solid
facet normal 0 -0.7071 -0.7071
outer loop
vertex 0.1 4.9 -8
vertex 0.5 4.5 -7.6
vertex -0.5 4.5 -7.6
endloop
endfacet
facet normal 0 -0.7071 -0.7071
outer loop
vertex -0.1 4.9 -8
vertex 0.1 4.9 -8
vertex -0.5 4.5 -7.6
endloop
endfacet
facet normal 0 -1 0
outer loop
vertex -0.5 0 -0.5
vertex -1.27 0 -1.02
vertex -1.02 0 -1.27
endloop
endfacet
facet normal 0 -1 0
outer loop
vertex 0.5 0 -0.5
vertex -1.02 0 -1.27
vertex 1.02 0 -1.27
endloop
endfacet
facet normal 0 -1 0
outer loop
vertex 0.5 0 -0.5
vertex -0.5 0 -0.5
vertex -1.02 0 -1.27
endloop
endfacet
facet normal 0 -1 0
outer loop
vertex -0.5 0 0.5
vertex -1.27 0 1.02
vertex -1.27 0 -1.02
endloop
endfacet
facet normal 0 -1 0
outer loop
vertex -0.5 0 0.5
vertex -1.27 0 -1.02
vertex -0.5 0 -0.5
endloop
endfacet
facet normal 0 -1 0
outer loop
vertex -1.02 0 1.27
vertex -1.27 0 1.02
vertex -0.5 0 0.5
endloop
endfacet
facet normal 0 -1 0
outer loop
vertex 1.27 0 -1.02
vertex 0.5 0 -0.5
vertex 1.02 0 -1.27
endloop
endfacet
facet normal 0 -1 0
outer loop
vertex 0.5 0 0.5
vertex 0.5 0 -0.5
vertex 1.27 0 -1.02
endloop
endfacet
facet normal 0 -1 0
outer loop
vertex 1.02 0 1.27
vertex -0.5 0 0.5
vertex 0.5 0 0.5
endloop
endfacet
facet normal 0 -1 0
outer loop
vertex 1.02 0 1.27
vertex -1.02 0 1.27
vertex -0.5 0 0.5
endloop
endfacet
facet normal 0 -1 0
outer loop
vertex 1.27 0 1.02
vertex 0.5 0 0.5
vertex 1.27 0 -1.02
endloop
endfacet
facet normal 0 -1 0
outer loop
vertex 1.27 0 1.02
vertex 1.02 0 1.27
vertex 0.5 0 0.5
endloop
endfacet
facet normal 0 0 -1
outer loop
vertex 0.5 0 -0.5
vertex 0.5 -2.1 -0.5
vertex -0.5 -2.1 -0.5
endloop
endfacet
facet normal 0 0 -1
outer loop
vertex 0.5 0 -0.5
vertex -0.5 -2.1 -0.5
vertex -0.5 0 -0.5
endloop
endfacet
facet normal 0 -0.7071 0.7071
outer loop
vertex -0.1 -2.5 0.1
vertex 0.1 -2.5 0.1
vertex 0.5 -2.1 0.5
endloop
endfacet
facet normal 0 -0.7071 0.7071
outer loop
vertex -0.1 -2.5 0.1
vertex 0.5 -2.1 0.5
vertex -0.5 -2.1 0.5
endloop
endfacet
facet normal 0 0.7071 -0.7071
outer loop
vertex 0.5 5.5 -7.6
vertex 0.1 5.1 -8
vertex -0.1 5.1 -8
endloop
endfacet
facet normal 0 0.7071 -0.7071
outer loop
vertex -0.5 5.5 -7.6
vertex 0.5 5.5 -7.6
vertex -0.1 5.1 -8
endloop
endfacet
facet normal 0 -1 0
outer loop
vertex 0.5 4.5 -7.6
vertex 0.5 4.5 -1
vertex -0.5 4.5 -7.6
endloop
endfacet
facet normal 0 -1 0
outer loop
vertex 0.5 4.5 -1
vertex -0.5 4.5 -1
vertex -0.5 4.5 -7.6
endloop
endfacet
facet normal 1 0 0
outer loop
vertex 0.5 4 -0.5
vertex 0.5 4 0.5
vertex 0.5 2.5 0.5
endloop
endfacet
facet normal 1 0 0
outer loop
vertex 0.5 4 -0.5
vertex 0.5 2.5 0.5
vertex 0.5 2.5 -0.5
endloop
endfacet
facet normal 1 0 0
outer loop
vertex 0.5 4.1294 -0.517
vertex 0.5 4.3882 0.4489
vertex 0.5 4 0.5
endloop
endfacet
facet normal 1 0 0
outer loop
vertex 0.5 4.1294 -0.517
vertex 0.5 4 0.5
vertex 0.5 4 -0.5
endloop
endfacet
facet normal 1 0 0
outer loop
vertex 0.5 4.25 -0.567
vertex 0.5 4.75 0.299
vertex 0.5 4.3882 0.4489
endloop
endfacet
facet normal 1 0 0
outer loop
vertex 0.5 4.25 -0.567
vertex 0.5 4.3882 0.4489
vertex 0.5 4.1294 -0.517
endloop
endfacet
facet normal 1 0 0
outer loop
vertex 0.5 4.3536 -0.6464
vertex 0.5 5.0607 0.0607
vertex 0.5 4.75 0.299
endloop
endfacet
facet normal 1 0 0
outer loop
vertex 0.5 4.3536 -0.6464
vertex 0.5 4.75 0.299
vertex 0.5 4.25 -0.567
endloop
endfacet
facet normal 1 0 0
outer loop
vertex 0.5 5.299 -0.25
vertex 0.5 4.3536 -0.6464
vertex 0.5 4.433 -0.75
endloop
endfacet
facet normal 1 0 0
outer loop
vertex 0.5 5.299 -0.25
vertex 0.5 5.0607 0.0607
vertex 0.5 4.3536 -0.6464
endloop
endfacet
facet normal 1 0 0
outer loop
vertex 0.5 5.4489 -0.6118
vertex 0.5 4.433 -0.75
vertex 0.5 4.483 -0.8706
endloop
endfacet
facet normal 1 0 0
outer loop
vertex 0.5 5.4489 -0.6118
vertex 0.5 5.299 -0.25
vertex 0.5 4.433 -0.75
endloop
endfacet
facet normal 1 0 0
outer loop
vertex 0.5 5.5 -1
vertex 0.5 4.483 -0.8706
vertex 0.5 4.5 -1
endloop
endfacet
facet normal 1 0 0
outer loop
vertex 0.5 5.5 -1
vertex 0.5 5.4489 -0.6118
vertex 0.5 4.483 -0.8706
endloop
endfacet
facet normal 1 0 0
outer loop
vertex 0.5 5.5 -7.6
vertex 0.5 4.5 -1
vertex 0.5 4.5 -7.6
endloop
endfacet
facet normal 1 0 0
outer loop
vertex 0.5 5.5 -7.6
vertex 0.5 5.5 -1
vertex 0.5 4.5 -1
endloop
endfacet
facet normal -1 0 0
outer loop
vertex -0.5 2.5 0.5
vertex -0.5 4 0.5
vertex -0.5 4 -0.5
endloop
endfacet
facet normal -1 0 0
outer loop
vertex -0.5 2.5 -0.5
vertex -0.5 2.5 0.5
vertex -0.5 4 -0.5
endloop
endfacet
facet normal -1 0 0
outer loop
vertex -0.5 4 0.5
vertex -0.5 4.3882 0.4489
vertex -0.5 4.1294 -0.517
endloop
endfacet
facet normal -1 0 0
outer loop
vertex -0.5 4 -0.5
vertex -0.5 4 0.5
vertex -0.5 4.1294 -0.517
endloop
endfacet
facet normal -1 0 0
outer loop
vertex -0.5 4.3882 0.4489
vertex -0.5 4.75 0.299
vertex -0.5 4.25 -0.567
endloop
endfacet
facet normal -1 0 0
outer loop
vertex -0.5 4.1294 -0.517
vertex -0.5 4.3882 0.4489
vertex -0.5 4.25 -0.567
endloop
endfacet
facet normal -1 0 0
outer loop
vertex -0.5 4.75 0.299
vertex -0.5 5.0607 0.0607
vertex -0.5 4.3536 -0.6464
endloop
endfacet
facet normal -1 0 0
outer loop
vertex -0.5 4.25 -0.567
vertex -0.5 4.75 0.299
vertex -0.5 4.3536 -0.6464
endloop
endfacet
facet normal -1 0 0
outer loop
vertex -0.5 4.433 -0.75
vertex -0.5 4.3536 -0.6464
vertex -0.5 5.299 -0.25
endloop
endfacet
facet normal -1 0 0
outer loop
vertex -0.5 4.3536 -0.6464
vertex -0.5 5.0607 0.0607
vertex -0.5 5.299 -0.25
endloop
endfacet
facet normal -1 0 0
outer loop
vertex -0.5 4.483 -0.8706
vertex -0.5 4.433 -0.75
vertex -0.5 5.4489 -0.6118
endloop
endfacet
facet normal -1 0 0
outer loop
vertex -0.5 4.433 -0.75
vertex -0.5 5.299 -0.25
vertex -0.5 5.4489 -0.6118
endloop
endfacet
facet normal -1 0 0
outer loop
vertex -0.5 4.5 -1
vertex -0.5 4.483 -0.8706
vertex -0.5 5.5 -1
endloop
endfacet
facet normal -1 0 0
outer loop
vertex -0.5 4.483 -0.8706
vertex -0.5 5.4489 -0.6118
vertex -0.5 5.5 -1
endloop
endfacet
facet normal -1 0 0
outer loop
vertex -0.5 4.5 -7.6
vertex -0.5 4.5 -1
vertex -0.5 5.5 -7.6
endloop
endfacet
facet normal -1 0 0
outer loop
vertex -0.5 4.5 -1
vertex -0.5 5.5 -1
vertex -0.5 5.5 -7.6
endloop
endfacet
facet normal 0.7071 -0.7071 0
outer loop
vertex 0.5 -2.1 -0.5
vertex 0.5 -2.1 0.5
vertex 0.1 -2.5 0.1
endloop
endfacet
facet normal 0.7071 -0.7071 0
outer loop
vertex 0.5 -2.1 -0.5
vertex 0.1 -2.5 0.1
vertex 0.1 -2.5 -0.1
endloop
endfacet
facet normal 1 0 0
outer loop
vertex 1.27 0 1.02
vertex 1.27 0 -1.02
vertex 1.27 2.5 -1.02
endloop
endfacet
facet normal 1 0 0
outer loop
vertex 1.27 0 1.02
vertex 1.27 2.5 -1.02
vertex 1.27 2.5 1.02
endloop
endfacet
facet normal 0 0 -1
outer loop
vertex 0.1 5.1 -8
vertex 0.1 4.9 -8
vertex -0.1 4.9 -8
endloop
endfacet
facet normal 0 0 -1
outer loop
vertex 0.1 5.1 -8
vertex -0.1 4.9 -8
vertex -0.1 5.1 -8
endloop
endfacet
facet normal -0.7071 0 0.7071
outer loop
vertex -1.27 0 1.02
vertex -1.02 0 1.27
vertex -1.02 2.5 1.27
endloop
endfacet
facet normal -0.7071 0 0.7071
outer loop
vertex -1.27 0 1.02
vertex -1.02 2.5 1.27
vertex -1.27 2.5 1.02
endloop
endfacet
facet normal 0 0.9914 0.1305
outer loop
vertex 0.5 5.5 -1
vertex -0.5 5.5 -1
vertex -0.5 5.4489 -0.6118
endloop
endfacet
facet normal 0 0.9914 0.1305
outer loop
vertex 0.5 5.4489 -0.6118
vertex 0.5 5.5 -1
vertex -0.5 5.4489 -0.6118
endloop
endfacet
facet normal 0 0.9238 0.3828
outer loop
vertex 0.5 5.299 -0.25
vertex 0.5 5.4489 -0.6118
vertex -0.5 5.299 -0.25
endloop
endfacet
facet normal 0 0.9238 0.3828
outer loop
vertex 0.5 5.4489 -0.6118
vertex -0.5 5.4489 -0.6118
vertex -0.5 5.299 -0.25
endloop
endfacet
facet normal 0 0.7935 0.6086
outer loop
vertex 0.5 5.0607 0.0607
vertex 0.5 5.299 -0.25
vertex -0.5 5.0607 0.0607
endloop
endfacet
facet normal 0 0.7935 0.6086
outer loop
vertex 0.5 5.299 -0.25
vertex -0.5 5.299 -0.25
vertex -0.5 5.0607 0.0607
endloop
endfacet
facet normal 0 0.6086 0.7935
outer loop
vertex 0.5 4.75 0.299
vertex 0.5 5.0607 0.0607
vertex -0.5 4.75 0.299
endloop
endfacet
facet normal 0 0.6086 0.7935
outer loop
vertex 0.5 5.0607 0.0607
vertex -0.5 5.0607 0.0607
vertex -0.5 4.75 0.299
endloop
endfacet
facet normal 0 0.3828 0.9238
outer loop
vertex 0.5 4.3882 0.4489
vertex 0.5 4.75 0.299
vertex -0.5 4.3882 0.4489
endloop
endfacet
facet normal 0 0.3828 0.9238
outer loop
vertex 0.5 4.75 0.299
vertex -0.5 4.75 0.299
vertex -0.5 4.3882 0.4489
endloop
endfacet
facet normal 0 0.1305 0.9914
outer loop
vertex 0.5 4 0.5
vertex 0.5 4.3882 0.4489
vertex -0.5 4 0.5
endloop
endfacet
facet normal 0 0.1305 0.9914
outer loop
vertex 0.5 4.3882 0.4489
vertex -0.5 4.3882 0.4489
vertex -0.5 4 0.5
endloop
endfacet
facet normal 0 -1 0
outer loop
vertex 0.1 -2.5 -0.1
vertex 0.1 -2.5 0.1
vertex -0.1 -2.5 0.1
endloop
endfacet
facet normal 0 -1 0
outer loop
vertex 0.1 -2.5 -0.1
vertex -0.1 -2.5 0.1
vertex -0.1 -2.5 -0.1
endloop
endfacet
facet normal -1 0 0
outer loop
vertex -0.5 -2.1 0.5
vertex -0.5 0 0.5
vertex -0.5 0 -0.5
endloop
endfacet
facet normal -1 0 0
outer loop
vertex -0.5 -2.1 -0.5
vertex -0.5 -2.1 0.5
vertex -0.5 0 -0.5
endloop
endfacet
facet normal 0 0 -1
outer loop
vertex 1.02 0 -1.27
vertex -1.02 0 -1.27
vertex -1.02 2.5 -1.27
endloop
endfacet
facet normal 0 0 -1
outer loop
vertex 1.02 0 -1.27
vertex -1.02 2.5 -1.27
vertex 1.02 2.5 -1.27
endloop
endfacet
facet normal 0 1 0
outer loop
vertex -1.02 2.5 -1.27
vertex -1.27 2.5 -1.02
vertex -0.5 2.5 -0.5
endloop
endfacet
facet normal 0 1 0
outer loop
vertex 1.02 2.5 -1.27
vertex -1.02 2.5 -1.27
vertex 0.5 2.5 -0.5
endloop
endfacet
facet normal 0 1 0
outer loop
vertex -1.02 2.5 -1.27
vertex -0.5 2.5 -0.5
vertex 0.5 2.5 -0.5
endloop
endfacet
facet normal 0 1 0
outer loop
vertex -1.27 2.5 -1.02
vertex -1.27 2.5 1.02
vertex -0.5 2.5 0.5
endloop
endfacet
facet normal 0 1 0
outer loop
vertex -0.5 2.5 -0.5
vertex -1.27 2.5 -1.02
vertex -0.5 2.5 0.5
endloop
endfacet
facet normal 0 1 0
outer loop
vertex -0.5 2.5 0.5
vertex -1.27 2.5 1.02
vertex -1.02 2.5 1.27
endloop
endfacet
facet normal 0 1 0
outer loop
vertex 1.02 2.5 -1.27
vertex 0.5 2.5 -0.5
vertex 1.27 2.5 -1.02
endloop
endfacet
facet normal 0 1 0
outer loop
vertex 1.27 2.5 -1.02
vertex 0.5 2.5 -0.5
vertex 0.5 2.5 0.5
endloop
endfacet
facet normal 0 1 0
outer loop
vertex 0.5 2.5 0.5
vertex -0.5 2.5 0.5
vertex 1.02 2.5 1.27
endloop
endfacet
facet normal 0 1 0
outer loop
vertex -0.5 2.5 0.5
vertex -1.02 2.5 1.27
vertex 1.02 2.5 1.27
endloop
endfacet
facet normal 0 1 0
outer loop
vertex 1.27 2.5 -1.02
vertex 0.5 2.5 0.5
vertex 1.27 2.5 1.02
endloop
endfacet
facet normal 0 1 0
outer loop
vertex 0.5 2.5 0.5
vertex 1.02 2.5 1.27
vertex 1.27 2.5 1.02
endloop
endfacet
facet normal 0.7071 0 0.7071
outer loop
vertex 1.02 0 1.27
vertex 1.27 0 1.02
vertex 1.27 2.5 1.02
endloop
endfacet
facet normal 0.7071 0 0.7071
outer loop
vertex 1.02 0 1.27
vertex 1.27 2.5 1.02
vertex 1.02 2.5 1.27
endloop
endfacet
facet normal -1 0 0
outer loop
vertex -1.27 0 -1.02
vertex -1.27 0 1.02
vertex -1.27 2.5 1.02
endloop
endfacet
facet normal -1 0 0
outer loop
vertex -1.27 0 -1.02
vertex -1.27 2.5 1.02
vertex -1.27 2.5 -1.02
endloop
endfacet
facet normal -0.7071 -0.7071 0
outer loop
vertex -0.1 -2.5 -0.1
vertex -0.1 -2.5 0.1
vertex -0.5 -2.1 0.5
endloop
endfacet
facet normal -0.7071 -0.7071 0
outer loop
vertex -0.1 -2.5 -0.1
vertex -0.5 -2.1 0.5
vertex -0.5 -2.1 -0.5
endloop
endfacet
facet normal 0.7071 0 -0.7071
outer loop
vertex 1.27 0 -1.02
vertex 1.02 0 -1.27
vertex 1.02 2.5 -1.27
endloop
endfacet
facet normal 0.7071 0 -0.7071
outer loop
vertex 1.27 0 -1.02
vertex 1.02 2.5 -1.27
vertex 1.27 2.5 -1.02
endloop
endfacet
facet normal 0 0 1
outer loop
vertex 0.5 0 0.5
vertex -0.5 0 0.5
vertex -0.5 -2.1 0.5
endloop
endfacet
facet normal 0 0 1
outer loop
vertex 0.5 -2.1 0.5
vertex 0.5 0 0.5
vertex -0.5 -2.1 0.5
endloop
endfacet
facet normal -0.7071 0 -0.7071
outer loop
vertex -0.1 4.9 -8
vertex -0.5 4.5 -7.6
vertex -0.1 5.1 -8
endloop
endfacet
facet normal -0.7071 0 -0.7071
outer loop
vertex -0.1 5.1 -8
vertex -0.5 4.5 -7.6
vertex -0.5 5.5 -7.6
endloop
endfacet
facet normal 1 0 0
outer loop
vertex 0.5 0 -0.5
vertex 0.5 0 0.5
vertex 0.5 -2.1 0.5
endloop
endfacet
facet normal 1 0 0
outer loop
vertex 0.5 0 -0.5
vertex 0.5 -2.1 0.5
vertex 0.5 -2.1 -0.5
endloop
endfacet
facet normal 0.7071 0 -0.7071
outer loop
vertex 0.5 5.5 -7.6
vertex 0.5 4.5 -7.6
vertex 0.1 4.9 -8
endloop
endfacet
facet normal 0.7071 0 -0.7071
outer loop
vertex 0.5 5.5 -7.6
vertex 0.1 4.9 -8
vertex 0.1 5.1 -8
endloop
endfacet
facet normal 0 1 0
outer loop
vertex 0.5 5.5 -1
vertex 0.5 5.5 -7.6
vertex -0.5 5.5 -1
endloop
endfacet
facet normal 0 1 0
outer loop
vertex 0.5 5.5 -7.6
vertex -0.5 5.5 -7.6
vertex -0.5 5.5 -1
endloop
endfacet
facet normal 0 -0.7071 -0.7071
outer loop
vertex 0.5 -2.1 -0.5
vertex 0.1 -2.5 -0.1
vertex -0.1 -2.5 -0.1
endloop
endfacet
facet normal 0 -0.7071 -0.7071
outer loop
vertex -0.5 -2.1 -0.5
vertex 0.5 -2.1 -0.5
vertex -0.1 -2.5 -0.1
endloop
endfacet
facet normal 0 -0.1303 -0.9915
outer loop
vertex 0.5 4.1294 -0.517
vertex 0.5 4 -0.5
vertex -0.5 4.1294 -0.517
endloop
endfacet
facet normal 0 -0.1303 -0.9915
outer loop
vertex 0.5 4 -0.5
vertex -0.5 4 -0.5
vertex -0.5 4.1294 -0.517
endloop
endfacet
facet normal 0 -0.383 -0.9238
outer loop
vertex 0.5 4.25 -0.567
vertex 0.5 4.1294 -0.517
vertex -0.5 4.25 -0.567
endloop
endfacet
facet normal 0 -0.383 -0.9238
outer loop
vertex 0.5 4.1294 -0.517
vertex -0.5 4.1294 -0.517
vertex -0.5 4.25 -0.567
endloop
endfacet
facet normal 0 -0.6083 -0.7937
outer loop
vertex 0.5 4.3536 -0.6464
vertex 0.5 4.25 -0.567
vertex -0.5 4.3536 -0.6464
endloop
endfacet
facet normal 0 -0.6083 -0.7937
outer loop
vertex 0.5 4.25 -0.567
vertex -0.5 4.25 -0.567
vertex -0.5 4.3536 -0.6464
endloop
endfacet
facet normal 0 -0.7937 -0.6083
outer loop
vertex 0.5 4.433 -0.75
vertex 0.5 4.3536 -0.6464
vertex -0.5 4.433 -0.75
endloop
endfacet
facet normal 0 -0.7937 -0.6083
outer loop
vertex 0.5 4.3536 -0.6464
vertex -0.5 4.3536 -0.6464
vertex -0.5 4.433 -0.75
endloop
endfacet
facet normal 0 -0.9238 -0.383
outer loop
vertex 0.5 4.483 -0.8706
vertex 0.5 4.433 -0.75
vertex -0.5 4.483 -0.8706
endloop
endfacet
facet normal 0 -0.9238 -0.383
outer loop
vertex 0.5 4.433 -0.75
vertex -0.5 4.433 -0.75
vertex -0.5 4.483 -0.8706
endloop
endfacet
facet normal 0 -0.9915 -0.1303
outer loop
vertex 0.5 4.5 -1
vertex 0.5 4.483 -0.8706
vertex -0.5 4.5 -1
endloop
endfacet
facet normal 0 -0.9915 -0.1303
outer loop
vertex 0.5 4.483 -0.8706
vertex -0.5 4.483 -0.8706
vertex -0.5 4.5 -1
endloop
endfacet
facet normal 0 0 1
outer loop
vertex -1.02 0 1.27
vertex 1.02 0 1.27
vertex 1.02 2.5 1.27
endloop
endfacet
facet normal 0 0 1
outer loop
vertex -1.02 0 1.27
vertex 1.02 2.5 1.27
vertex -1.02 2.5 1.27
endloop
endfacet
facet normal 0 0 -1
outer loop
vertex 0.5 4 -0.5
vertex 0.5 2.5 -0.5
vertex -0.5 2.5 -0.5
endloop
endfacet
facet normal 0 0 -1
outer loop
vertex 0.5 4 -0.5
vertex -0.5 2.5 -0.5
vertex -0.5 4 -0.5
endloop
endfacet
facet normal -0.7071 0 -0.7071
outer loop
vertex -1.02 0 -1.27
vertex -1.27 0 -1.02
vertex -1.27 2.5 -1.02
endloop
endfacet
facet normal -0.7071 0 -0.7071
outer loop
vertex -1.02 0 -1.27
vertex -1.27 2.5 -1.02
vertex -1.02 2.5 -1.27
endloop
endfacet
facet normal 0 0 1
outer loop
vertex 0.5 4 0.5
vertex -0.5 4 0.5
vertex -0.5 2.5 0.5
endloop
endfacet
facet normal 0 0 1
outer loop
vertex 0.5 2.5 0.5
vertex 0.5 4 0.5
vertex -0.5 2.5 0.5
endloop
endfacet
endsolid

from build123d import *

# Parameters (mm, degrees)
BOSS_EXTRUDE1_DEPTH      = 2.5
EXTRUDE_THIN1_DEPTH      = 0.5
EXTRUDE_THIN1_DEPTH_BACK = 0.5
CHAMFER1_SIZE            = 0.4


with BuildPart() as part:
    # Sketch1 → Boss-Extrude1 (new body)
    with BuildSketch(Plane(origin=(0, 0, 0), x_dir=(-1, 0, 0), z_dir=(0, 1, 0))):
        Polygon((-1.02, 1.27), (1.02, 1.27), (1.27, 1.02), (1.27, -1.02), (1.02, -1.27), (-1.02, -1.27), (-1.27, -1.02), (-1.27, 1.02), align=None)
    extrude(amount=BOSS_EXTRUDE1_DEPTH)

    # Sketch2 → Extrude-Thin1 (add, two sides: drawn at the far end of the back side and taken through both)
    with BuildSketch(Plane(origin=(0, 0, 0), x_dir=(0, 0, -1), z_dir=(1, 0, 0)).offset(-EXTRUDE_THIN1_DEPTH_BACK)):
        with BuildLine():
            Line((0.5, -2.5), (0.5, 0))
            Line((0.5, 0), (0.5, 4))
            ThreePointArc((0.5, 4), (0.646446609, 4.353553391), (1, 4.5))
            Line((1, 4.5), (8, 4.5))
            Line((8, 4.5), (8, 5.5))
            Line((8, 5.5), (1, 5.5))
            ThreePointArc((1, 5.5), (-0.060660172, 5.060660172), (-0.5, 4))
            Line((-0.5, 4), (-0.5, 0))
            Line((-0.5, 0), (-0.5, -2.5))
            Line((-0.5, -2.5), (0.5, -2.5))
        make_face()
    extrude(amount=EXTRUDE_THIN1_DEPTH + EXTRUDE_THIN1_DEPTH_BACK)

    # Chamfer1
    chamfer1_edges = [part.edges().sort_by_distance(p)[0] for p in [
        (-0.5, 5, -8),
        (0, 4.5, -8),
        (0.5, 5, -8),
        (0, 5.5, -8),
        (0, -2.5, -0.5),
        (-0.5, -2.5, 0),
        (0, -2.5, 0.5),
        (0.5, -2.5, 0),
    ]]
    chamfer(chamfer1_edges, length=CHAMFER1_SIZE)


solid = part.part
